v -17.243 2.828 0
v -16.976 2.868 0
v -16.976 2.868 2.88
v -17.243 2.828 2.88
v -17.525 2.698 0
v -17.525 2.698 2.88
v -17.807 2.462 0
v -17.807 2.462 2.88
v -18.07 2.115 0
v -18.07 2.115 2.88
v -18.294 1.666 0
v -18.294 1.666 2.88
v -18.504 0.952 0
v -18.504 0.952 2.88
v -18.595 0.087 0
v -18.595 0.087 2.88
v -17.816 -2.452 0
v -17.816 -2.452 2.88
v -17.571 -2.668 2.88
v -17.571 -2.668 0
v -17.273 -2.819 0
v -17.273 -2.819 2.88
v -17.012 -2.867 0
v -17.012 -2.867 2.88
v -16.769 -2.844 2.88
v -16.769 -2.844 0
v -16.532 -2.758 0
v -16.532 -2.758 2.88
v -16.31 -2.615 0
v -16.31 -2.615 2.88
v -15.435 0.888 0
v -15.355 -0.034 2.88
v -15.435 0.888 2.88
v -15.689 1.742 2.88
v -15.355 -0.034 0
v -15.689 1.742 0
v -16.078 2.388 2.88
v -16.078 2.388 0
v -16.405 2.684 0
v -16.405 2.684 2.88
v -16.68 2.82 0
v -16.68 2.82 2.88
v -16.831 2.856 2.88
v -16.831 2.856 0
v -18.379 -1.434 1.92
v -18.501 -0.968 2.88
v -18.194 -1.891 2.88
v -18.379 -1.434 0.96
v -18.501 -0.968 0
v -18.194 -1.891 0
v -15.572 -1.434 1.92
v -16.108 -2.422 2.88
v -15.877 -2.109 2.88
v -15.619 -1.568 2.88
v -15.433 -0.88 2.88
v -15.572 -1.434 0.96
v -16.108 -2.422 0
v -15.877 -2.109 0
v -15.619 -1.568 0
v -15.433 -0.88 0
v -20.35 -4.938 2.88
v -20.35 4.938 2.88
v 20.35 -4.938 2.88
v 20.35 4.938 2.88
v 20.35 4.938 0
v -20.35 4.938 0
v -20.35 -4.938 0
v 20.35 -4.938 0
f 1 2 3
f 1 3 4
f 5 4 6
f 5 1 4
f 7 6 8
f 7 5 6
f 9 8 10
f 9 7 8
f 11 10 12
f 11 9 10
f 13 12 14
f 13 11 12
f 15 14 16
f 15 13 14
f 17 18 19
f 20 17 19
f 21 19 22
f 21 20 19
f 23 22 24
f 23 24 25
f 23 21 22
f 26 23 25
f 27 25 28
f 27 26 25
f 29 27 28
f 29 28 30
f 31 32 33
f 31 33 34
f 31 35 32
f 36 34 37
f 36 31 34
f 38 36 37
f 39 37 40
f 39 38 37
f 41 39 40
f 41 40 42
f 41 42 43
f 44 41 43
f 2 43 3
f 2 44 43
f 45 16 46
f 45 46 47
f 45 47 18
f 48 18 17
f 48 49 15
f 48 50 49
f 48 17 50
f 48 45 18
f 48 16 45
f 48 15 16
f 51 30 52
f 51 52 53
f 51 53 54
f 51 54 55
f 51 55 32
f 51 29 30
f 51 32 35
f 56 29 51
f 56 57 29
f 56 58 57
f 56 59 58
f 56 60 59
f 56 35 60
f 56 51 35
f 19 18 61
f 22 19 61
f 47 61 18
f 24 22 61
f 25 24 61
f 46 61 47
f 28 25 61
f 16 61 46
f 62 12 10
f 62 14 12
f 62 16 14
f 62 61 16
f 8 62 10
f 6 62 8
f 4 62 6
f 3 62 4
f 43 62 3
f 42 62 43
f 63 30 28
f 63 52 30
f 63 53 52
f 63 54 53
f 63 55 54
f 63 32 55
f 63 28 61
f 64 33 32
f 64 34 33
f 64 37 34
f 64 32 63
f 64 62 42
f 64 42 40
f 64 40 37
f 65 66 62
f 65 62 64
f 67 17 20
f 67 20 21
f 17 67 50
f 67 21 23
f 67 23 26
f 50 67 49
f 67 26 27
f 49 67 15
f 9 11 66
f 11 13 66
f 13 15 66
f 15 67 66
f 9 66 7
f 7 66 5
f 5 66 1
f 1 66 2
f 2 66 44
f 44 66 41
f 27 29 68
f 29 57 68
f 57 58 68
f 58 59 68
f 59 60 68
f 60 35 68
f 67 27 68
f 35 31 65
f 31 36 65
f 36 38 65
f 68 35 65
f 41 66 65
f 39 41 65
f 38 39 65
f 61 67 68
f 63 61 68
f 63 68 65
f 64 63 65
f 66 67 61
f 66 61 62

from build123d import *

# Parameters (mm, degrees)
F0_W     = 40.7
F0_H     = 9.875
F1_DEPTH = 2.88


with BuildPart() as f1:
    # F0 (on Top) → F1 (new body)
    with BuildSketch(Plane.XY):
        Rectangle(F0_W, F0_H)
        with BuildLine():
            add(Edge.make_bspline(
                [(-16.9756039977, 2.8678886592), (-19.7820491915, 2.8678886592), (-18.3788265946, -1.4339443296), (-16.9756039977, -5.7357773185), (-15.5723814008, -1.4339443296), (-14.1691588039, 2.8678886592), (-16.9756039977, 2.8678886592)],
                knots=[0, 0, 0, 2.0943951024, 2.0943951024, 4.1887902048, 4.1887902048, 6.2831853072, 6.2831853072, 6.2831853072], degree=2, weights=[1, 0.5, 1, 0.5, 1, 0.5, 1]))
        make_face(mode=Mode.SUBTRACT)
    extrude(amount=F1_DEPTH)


solid = f1.part
